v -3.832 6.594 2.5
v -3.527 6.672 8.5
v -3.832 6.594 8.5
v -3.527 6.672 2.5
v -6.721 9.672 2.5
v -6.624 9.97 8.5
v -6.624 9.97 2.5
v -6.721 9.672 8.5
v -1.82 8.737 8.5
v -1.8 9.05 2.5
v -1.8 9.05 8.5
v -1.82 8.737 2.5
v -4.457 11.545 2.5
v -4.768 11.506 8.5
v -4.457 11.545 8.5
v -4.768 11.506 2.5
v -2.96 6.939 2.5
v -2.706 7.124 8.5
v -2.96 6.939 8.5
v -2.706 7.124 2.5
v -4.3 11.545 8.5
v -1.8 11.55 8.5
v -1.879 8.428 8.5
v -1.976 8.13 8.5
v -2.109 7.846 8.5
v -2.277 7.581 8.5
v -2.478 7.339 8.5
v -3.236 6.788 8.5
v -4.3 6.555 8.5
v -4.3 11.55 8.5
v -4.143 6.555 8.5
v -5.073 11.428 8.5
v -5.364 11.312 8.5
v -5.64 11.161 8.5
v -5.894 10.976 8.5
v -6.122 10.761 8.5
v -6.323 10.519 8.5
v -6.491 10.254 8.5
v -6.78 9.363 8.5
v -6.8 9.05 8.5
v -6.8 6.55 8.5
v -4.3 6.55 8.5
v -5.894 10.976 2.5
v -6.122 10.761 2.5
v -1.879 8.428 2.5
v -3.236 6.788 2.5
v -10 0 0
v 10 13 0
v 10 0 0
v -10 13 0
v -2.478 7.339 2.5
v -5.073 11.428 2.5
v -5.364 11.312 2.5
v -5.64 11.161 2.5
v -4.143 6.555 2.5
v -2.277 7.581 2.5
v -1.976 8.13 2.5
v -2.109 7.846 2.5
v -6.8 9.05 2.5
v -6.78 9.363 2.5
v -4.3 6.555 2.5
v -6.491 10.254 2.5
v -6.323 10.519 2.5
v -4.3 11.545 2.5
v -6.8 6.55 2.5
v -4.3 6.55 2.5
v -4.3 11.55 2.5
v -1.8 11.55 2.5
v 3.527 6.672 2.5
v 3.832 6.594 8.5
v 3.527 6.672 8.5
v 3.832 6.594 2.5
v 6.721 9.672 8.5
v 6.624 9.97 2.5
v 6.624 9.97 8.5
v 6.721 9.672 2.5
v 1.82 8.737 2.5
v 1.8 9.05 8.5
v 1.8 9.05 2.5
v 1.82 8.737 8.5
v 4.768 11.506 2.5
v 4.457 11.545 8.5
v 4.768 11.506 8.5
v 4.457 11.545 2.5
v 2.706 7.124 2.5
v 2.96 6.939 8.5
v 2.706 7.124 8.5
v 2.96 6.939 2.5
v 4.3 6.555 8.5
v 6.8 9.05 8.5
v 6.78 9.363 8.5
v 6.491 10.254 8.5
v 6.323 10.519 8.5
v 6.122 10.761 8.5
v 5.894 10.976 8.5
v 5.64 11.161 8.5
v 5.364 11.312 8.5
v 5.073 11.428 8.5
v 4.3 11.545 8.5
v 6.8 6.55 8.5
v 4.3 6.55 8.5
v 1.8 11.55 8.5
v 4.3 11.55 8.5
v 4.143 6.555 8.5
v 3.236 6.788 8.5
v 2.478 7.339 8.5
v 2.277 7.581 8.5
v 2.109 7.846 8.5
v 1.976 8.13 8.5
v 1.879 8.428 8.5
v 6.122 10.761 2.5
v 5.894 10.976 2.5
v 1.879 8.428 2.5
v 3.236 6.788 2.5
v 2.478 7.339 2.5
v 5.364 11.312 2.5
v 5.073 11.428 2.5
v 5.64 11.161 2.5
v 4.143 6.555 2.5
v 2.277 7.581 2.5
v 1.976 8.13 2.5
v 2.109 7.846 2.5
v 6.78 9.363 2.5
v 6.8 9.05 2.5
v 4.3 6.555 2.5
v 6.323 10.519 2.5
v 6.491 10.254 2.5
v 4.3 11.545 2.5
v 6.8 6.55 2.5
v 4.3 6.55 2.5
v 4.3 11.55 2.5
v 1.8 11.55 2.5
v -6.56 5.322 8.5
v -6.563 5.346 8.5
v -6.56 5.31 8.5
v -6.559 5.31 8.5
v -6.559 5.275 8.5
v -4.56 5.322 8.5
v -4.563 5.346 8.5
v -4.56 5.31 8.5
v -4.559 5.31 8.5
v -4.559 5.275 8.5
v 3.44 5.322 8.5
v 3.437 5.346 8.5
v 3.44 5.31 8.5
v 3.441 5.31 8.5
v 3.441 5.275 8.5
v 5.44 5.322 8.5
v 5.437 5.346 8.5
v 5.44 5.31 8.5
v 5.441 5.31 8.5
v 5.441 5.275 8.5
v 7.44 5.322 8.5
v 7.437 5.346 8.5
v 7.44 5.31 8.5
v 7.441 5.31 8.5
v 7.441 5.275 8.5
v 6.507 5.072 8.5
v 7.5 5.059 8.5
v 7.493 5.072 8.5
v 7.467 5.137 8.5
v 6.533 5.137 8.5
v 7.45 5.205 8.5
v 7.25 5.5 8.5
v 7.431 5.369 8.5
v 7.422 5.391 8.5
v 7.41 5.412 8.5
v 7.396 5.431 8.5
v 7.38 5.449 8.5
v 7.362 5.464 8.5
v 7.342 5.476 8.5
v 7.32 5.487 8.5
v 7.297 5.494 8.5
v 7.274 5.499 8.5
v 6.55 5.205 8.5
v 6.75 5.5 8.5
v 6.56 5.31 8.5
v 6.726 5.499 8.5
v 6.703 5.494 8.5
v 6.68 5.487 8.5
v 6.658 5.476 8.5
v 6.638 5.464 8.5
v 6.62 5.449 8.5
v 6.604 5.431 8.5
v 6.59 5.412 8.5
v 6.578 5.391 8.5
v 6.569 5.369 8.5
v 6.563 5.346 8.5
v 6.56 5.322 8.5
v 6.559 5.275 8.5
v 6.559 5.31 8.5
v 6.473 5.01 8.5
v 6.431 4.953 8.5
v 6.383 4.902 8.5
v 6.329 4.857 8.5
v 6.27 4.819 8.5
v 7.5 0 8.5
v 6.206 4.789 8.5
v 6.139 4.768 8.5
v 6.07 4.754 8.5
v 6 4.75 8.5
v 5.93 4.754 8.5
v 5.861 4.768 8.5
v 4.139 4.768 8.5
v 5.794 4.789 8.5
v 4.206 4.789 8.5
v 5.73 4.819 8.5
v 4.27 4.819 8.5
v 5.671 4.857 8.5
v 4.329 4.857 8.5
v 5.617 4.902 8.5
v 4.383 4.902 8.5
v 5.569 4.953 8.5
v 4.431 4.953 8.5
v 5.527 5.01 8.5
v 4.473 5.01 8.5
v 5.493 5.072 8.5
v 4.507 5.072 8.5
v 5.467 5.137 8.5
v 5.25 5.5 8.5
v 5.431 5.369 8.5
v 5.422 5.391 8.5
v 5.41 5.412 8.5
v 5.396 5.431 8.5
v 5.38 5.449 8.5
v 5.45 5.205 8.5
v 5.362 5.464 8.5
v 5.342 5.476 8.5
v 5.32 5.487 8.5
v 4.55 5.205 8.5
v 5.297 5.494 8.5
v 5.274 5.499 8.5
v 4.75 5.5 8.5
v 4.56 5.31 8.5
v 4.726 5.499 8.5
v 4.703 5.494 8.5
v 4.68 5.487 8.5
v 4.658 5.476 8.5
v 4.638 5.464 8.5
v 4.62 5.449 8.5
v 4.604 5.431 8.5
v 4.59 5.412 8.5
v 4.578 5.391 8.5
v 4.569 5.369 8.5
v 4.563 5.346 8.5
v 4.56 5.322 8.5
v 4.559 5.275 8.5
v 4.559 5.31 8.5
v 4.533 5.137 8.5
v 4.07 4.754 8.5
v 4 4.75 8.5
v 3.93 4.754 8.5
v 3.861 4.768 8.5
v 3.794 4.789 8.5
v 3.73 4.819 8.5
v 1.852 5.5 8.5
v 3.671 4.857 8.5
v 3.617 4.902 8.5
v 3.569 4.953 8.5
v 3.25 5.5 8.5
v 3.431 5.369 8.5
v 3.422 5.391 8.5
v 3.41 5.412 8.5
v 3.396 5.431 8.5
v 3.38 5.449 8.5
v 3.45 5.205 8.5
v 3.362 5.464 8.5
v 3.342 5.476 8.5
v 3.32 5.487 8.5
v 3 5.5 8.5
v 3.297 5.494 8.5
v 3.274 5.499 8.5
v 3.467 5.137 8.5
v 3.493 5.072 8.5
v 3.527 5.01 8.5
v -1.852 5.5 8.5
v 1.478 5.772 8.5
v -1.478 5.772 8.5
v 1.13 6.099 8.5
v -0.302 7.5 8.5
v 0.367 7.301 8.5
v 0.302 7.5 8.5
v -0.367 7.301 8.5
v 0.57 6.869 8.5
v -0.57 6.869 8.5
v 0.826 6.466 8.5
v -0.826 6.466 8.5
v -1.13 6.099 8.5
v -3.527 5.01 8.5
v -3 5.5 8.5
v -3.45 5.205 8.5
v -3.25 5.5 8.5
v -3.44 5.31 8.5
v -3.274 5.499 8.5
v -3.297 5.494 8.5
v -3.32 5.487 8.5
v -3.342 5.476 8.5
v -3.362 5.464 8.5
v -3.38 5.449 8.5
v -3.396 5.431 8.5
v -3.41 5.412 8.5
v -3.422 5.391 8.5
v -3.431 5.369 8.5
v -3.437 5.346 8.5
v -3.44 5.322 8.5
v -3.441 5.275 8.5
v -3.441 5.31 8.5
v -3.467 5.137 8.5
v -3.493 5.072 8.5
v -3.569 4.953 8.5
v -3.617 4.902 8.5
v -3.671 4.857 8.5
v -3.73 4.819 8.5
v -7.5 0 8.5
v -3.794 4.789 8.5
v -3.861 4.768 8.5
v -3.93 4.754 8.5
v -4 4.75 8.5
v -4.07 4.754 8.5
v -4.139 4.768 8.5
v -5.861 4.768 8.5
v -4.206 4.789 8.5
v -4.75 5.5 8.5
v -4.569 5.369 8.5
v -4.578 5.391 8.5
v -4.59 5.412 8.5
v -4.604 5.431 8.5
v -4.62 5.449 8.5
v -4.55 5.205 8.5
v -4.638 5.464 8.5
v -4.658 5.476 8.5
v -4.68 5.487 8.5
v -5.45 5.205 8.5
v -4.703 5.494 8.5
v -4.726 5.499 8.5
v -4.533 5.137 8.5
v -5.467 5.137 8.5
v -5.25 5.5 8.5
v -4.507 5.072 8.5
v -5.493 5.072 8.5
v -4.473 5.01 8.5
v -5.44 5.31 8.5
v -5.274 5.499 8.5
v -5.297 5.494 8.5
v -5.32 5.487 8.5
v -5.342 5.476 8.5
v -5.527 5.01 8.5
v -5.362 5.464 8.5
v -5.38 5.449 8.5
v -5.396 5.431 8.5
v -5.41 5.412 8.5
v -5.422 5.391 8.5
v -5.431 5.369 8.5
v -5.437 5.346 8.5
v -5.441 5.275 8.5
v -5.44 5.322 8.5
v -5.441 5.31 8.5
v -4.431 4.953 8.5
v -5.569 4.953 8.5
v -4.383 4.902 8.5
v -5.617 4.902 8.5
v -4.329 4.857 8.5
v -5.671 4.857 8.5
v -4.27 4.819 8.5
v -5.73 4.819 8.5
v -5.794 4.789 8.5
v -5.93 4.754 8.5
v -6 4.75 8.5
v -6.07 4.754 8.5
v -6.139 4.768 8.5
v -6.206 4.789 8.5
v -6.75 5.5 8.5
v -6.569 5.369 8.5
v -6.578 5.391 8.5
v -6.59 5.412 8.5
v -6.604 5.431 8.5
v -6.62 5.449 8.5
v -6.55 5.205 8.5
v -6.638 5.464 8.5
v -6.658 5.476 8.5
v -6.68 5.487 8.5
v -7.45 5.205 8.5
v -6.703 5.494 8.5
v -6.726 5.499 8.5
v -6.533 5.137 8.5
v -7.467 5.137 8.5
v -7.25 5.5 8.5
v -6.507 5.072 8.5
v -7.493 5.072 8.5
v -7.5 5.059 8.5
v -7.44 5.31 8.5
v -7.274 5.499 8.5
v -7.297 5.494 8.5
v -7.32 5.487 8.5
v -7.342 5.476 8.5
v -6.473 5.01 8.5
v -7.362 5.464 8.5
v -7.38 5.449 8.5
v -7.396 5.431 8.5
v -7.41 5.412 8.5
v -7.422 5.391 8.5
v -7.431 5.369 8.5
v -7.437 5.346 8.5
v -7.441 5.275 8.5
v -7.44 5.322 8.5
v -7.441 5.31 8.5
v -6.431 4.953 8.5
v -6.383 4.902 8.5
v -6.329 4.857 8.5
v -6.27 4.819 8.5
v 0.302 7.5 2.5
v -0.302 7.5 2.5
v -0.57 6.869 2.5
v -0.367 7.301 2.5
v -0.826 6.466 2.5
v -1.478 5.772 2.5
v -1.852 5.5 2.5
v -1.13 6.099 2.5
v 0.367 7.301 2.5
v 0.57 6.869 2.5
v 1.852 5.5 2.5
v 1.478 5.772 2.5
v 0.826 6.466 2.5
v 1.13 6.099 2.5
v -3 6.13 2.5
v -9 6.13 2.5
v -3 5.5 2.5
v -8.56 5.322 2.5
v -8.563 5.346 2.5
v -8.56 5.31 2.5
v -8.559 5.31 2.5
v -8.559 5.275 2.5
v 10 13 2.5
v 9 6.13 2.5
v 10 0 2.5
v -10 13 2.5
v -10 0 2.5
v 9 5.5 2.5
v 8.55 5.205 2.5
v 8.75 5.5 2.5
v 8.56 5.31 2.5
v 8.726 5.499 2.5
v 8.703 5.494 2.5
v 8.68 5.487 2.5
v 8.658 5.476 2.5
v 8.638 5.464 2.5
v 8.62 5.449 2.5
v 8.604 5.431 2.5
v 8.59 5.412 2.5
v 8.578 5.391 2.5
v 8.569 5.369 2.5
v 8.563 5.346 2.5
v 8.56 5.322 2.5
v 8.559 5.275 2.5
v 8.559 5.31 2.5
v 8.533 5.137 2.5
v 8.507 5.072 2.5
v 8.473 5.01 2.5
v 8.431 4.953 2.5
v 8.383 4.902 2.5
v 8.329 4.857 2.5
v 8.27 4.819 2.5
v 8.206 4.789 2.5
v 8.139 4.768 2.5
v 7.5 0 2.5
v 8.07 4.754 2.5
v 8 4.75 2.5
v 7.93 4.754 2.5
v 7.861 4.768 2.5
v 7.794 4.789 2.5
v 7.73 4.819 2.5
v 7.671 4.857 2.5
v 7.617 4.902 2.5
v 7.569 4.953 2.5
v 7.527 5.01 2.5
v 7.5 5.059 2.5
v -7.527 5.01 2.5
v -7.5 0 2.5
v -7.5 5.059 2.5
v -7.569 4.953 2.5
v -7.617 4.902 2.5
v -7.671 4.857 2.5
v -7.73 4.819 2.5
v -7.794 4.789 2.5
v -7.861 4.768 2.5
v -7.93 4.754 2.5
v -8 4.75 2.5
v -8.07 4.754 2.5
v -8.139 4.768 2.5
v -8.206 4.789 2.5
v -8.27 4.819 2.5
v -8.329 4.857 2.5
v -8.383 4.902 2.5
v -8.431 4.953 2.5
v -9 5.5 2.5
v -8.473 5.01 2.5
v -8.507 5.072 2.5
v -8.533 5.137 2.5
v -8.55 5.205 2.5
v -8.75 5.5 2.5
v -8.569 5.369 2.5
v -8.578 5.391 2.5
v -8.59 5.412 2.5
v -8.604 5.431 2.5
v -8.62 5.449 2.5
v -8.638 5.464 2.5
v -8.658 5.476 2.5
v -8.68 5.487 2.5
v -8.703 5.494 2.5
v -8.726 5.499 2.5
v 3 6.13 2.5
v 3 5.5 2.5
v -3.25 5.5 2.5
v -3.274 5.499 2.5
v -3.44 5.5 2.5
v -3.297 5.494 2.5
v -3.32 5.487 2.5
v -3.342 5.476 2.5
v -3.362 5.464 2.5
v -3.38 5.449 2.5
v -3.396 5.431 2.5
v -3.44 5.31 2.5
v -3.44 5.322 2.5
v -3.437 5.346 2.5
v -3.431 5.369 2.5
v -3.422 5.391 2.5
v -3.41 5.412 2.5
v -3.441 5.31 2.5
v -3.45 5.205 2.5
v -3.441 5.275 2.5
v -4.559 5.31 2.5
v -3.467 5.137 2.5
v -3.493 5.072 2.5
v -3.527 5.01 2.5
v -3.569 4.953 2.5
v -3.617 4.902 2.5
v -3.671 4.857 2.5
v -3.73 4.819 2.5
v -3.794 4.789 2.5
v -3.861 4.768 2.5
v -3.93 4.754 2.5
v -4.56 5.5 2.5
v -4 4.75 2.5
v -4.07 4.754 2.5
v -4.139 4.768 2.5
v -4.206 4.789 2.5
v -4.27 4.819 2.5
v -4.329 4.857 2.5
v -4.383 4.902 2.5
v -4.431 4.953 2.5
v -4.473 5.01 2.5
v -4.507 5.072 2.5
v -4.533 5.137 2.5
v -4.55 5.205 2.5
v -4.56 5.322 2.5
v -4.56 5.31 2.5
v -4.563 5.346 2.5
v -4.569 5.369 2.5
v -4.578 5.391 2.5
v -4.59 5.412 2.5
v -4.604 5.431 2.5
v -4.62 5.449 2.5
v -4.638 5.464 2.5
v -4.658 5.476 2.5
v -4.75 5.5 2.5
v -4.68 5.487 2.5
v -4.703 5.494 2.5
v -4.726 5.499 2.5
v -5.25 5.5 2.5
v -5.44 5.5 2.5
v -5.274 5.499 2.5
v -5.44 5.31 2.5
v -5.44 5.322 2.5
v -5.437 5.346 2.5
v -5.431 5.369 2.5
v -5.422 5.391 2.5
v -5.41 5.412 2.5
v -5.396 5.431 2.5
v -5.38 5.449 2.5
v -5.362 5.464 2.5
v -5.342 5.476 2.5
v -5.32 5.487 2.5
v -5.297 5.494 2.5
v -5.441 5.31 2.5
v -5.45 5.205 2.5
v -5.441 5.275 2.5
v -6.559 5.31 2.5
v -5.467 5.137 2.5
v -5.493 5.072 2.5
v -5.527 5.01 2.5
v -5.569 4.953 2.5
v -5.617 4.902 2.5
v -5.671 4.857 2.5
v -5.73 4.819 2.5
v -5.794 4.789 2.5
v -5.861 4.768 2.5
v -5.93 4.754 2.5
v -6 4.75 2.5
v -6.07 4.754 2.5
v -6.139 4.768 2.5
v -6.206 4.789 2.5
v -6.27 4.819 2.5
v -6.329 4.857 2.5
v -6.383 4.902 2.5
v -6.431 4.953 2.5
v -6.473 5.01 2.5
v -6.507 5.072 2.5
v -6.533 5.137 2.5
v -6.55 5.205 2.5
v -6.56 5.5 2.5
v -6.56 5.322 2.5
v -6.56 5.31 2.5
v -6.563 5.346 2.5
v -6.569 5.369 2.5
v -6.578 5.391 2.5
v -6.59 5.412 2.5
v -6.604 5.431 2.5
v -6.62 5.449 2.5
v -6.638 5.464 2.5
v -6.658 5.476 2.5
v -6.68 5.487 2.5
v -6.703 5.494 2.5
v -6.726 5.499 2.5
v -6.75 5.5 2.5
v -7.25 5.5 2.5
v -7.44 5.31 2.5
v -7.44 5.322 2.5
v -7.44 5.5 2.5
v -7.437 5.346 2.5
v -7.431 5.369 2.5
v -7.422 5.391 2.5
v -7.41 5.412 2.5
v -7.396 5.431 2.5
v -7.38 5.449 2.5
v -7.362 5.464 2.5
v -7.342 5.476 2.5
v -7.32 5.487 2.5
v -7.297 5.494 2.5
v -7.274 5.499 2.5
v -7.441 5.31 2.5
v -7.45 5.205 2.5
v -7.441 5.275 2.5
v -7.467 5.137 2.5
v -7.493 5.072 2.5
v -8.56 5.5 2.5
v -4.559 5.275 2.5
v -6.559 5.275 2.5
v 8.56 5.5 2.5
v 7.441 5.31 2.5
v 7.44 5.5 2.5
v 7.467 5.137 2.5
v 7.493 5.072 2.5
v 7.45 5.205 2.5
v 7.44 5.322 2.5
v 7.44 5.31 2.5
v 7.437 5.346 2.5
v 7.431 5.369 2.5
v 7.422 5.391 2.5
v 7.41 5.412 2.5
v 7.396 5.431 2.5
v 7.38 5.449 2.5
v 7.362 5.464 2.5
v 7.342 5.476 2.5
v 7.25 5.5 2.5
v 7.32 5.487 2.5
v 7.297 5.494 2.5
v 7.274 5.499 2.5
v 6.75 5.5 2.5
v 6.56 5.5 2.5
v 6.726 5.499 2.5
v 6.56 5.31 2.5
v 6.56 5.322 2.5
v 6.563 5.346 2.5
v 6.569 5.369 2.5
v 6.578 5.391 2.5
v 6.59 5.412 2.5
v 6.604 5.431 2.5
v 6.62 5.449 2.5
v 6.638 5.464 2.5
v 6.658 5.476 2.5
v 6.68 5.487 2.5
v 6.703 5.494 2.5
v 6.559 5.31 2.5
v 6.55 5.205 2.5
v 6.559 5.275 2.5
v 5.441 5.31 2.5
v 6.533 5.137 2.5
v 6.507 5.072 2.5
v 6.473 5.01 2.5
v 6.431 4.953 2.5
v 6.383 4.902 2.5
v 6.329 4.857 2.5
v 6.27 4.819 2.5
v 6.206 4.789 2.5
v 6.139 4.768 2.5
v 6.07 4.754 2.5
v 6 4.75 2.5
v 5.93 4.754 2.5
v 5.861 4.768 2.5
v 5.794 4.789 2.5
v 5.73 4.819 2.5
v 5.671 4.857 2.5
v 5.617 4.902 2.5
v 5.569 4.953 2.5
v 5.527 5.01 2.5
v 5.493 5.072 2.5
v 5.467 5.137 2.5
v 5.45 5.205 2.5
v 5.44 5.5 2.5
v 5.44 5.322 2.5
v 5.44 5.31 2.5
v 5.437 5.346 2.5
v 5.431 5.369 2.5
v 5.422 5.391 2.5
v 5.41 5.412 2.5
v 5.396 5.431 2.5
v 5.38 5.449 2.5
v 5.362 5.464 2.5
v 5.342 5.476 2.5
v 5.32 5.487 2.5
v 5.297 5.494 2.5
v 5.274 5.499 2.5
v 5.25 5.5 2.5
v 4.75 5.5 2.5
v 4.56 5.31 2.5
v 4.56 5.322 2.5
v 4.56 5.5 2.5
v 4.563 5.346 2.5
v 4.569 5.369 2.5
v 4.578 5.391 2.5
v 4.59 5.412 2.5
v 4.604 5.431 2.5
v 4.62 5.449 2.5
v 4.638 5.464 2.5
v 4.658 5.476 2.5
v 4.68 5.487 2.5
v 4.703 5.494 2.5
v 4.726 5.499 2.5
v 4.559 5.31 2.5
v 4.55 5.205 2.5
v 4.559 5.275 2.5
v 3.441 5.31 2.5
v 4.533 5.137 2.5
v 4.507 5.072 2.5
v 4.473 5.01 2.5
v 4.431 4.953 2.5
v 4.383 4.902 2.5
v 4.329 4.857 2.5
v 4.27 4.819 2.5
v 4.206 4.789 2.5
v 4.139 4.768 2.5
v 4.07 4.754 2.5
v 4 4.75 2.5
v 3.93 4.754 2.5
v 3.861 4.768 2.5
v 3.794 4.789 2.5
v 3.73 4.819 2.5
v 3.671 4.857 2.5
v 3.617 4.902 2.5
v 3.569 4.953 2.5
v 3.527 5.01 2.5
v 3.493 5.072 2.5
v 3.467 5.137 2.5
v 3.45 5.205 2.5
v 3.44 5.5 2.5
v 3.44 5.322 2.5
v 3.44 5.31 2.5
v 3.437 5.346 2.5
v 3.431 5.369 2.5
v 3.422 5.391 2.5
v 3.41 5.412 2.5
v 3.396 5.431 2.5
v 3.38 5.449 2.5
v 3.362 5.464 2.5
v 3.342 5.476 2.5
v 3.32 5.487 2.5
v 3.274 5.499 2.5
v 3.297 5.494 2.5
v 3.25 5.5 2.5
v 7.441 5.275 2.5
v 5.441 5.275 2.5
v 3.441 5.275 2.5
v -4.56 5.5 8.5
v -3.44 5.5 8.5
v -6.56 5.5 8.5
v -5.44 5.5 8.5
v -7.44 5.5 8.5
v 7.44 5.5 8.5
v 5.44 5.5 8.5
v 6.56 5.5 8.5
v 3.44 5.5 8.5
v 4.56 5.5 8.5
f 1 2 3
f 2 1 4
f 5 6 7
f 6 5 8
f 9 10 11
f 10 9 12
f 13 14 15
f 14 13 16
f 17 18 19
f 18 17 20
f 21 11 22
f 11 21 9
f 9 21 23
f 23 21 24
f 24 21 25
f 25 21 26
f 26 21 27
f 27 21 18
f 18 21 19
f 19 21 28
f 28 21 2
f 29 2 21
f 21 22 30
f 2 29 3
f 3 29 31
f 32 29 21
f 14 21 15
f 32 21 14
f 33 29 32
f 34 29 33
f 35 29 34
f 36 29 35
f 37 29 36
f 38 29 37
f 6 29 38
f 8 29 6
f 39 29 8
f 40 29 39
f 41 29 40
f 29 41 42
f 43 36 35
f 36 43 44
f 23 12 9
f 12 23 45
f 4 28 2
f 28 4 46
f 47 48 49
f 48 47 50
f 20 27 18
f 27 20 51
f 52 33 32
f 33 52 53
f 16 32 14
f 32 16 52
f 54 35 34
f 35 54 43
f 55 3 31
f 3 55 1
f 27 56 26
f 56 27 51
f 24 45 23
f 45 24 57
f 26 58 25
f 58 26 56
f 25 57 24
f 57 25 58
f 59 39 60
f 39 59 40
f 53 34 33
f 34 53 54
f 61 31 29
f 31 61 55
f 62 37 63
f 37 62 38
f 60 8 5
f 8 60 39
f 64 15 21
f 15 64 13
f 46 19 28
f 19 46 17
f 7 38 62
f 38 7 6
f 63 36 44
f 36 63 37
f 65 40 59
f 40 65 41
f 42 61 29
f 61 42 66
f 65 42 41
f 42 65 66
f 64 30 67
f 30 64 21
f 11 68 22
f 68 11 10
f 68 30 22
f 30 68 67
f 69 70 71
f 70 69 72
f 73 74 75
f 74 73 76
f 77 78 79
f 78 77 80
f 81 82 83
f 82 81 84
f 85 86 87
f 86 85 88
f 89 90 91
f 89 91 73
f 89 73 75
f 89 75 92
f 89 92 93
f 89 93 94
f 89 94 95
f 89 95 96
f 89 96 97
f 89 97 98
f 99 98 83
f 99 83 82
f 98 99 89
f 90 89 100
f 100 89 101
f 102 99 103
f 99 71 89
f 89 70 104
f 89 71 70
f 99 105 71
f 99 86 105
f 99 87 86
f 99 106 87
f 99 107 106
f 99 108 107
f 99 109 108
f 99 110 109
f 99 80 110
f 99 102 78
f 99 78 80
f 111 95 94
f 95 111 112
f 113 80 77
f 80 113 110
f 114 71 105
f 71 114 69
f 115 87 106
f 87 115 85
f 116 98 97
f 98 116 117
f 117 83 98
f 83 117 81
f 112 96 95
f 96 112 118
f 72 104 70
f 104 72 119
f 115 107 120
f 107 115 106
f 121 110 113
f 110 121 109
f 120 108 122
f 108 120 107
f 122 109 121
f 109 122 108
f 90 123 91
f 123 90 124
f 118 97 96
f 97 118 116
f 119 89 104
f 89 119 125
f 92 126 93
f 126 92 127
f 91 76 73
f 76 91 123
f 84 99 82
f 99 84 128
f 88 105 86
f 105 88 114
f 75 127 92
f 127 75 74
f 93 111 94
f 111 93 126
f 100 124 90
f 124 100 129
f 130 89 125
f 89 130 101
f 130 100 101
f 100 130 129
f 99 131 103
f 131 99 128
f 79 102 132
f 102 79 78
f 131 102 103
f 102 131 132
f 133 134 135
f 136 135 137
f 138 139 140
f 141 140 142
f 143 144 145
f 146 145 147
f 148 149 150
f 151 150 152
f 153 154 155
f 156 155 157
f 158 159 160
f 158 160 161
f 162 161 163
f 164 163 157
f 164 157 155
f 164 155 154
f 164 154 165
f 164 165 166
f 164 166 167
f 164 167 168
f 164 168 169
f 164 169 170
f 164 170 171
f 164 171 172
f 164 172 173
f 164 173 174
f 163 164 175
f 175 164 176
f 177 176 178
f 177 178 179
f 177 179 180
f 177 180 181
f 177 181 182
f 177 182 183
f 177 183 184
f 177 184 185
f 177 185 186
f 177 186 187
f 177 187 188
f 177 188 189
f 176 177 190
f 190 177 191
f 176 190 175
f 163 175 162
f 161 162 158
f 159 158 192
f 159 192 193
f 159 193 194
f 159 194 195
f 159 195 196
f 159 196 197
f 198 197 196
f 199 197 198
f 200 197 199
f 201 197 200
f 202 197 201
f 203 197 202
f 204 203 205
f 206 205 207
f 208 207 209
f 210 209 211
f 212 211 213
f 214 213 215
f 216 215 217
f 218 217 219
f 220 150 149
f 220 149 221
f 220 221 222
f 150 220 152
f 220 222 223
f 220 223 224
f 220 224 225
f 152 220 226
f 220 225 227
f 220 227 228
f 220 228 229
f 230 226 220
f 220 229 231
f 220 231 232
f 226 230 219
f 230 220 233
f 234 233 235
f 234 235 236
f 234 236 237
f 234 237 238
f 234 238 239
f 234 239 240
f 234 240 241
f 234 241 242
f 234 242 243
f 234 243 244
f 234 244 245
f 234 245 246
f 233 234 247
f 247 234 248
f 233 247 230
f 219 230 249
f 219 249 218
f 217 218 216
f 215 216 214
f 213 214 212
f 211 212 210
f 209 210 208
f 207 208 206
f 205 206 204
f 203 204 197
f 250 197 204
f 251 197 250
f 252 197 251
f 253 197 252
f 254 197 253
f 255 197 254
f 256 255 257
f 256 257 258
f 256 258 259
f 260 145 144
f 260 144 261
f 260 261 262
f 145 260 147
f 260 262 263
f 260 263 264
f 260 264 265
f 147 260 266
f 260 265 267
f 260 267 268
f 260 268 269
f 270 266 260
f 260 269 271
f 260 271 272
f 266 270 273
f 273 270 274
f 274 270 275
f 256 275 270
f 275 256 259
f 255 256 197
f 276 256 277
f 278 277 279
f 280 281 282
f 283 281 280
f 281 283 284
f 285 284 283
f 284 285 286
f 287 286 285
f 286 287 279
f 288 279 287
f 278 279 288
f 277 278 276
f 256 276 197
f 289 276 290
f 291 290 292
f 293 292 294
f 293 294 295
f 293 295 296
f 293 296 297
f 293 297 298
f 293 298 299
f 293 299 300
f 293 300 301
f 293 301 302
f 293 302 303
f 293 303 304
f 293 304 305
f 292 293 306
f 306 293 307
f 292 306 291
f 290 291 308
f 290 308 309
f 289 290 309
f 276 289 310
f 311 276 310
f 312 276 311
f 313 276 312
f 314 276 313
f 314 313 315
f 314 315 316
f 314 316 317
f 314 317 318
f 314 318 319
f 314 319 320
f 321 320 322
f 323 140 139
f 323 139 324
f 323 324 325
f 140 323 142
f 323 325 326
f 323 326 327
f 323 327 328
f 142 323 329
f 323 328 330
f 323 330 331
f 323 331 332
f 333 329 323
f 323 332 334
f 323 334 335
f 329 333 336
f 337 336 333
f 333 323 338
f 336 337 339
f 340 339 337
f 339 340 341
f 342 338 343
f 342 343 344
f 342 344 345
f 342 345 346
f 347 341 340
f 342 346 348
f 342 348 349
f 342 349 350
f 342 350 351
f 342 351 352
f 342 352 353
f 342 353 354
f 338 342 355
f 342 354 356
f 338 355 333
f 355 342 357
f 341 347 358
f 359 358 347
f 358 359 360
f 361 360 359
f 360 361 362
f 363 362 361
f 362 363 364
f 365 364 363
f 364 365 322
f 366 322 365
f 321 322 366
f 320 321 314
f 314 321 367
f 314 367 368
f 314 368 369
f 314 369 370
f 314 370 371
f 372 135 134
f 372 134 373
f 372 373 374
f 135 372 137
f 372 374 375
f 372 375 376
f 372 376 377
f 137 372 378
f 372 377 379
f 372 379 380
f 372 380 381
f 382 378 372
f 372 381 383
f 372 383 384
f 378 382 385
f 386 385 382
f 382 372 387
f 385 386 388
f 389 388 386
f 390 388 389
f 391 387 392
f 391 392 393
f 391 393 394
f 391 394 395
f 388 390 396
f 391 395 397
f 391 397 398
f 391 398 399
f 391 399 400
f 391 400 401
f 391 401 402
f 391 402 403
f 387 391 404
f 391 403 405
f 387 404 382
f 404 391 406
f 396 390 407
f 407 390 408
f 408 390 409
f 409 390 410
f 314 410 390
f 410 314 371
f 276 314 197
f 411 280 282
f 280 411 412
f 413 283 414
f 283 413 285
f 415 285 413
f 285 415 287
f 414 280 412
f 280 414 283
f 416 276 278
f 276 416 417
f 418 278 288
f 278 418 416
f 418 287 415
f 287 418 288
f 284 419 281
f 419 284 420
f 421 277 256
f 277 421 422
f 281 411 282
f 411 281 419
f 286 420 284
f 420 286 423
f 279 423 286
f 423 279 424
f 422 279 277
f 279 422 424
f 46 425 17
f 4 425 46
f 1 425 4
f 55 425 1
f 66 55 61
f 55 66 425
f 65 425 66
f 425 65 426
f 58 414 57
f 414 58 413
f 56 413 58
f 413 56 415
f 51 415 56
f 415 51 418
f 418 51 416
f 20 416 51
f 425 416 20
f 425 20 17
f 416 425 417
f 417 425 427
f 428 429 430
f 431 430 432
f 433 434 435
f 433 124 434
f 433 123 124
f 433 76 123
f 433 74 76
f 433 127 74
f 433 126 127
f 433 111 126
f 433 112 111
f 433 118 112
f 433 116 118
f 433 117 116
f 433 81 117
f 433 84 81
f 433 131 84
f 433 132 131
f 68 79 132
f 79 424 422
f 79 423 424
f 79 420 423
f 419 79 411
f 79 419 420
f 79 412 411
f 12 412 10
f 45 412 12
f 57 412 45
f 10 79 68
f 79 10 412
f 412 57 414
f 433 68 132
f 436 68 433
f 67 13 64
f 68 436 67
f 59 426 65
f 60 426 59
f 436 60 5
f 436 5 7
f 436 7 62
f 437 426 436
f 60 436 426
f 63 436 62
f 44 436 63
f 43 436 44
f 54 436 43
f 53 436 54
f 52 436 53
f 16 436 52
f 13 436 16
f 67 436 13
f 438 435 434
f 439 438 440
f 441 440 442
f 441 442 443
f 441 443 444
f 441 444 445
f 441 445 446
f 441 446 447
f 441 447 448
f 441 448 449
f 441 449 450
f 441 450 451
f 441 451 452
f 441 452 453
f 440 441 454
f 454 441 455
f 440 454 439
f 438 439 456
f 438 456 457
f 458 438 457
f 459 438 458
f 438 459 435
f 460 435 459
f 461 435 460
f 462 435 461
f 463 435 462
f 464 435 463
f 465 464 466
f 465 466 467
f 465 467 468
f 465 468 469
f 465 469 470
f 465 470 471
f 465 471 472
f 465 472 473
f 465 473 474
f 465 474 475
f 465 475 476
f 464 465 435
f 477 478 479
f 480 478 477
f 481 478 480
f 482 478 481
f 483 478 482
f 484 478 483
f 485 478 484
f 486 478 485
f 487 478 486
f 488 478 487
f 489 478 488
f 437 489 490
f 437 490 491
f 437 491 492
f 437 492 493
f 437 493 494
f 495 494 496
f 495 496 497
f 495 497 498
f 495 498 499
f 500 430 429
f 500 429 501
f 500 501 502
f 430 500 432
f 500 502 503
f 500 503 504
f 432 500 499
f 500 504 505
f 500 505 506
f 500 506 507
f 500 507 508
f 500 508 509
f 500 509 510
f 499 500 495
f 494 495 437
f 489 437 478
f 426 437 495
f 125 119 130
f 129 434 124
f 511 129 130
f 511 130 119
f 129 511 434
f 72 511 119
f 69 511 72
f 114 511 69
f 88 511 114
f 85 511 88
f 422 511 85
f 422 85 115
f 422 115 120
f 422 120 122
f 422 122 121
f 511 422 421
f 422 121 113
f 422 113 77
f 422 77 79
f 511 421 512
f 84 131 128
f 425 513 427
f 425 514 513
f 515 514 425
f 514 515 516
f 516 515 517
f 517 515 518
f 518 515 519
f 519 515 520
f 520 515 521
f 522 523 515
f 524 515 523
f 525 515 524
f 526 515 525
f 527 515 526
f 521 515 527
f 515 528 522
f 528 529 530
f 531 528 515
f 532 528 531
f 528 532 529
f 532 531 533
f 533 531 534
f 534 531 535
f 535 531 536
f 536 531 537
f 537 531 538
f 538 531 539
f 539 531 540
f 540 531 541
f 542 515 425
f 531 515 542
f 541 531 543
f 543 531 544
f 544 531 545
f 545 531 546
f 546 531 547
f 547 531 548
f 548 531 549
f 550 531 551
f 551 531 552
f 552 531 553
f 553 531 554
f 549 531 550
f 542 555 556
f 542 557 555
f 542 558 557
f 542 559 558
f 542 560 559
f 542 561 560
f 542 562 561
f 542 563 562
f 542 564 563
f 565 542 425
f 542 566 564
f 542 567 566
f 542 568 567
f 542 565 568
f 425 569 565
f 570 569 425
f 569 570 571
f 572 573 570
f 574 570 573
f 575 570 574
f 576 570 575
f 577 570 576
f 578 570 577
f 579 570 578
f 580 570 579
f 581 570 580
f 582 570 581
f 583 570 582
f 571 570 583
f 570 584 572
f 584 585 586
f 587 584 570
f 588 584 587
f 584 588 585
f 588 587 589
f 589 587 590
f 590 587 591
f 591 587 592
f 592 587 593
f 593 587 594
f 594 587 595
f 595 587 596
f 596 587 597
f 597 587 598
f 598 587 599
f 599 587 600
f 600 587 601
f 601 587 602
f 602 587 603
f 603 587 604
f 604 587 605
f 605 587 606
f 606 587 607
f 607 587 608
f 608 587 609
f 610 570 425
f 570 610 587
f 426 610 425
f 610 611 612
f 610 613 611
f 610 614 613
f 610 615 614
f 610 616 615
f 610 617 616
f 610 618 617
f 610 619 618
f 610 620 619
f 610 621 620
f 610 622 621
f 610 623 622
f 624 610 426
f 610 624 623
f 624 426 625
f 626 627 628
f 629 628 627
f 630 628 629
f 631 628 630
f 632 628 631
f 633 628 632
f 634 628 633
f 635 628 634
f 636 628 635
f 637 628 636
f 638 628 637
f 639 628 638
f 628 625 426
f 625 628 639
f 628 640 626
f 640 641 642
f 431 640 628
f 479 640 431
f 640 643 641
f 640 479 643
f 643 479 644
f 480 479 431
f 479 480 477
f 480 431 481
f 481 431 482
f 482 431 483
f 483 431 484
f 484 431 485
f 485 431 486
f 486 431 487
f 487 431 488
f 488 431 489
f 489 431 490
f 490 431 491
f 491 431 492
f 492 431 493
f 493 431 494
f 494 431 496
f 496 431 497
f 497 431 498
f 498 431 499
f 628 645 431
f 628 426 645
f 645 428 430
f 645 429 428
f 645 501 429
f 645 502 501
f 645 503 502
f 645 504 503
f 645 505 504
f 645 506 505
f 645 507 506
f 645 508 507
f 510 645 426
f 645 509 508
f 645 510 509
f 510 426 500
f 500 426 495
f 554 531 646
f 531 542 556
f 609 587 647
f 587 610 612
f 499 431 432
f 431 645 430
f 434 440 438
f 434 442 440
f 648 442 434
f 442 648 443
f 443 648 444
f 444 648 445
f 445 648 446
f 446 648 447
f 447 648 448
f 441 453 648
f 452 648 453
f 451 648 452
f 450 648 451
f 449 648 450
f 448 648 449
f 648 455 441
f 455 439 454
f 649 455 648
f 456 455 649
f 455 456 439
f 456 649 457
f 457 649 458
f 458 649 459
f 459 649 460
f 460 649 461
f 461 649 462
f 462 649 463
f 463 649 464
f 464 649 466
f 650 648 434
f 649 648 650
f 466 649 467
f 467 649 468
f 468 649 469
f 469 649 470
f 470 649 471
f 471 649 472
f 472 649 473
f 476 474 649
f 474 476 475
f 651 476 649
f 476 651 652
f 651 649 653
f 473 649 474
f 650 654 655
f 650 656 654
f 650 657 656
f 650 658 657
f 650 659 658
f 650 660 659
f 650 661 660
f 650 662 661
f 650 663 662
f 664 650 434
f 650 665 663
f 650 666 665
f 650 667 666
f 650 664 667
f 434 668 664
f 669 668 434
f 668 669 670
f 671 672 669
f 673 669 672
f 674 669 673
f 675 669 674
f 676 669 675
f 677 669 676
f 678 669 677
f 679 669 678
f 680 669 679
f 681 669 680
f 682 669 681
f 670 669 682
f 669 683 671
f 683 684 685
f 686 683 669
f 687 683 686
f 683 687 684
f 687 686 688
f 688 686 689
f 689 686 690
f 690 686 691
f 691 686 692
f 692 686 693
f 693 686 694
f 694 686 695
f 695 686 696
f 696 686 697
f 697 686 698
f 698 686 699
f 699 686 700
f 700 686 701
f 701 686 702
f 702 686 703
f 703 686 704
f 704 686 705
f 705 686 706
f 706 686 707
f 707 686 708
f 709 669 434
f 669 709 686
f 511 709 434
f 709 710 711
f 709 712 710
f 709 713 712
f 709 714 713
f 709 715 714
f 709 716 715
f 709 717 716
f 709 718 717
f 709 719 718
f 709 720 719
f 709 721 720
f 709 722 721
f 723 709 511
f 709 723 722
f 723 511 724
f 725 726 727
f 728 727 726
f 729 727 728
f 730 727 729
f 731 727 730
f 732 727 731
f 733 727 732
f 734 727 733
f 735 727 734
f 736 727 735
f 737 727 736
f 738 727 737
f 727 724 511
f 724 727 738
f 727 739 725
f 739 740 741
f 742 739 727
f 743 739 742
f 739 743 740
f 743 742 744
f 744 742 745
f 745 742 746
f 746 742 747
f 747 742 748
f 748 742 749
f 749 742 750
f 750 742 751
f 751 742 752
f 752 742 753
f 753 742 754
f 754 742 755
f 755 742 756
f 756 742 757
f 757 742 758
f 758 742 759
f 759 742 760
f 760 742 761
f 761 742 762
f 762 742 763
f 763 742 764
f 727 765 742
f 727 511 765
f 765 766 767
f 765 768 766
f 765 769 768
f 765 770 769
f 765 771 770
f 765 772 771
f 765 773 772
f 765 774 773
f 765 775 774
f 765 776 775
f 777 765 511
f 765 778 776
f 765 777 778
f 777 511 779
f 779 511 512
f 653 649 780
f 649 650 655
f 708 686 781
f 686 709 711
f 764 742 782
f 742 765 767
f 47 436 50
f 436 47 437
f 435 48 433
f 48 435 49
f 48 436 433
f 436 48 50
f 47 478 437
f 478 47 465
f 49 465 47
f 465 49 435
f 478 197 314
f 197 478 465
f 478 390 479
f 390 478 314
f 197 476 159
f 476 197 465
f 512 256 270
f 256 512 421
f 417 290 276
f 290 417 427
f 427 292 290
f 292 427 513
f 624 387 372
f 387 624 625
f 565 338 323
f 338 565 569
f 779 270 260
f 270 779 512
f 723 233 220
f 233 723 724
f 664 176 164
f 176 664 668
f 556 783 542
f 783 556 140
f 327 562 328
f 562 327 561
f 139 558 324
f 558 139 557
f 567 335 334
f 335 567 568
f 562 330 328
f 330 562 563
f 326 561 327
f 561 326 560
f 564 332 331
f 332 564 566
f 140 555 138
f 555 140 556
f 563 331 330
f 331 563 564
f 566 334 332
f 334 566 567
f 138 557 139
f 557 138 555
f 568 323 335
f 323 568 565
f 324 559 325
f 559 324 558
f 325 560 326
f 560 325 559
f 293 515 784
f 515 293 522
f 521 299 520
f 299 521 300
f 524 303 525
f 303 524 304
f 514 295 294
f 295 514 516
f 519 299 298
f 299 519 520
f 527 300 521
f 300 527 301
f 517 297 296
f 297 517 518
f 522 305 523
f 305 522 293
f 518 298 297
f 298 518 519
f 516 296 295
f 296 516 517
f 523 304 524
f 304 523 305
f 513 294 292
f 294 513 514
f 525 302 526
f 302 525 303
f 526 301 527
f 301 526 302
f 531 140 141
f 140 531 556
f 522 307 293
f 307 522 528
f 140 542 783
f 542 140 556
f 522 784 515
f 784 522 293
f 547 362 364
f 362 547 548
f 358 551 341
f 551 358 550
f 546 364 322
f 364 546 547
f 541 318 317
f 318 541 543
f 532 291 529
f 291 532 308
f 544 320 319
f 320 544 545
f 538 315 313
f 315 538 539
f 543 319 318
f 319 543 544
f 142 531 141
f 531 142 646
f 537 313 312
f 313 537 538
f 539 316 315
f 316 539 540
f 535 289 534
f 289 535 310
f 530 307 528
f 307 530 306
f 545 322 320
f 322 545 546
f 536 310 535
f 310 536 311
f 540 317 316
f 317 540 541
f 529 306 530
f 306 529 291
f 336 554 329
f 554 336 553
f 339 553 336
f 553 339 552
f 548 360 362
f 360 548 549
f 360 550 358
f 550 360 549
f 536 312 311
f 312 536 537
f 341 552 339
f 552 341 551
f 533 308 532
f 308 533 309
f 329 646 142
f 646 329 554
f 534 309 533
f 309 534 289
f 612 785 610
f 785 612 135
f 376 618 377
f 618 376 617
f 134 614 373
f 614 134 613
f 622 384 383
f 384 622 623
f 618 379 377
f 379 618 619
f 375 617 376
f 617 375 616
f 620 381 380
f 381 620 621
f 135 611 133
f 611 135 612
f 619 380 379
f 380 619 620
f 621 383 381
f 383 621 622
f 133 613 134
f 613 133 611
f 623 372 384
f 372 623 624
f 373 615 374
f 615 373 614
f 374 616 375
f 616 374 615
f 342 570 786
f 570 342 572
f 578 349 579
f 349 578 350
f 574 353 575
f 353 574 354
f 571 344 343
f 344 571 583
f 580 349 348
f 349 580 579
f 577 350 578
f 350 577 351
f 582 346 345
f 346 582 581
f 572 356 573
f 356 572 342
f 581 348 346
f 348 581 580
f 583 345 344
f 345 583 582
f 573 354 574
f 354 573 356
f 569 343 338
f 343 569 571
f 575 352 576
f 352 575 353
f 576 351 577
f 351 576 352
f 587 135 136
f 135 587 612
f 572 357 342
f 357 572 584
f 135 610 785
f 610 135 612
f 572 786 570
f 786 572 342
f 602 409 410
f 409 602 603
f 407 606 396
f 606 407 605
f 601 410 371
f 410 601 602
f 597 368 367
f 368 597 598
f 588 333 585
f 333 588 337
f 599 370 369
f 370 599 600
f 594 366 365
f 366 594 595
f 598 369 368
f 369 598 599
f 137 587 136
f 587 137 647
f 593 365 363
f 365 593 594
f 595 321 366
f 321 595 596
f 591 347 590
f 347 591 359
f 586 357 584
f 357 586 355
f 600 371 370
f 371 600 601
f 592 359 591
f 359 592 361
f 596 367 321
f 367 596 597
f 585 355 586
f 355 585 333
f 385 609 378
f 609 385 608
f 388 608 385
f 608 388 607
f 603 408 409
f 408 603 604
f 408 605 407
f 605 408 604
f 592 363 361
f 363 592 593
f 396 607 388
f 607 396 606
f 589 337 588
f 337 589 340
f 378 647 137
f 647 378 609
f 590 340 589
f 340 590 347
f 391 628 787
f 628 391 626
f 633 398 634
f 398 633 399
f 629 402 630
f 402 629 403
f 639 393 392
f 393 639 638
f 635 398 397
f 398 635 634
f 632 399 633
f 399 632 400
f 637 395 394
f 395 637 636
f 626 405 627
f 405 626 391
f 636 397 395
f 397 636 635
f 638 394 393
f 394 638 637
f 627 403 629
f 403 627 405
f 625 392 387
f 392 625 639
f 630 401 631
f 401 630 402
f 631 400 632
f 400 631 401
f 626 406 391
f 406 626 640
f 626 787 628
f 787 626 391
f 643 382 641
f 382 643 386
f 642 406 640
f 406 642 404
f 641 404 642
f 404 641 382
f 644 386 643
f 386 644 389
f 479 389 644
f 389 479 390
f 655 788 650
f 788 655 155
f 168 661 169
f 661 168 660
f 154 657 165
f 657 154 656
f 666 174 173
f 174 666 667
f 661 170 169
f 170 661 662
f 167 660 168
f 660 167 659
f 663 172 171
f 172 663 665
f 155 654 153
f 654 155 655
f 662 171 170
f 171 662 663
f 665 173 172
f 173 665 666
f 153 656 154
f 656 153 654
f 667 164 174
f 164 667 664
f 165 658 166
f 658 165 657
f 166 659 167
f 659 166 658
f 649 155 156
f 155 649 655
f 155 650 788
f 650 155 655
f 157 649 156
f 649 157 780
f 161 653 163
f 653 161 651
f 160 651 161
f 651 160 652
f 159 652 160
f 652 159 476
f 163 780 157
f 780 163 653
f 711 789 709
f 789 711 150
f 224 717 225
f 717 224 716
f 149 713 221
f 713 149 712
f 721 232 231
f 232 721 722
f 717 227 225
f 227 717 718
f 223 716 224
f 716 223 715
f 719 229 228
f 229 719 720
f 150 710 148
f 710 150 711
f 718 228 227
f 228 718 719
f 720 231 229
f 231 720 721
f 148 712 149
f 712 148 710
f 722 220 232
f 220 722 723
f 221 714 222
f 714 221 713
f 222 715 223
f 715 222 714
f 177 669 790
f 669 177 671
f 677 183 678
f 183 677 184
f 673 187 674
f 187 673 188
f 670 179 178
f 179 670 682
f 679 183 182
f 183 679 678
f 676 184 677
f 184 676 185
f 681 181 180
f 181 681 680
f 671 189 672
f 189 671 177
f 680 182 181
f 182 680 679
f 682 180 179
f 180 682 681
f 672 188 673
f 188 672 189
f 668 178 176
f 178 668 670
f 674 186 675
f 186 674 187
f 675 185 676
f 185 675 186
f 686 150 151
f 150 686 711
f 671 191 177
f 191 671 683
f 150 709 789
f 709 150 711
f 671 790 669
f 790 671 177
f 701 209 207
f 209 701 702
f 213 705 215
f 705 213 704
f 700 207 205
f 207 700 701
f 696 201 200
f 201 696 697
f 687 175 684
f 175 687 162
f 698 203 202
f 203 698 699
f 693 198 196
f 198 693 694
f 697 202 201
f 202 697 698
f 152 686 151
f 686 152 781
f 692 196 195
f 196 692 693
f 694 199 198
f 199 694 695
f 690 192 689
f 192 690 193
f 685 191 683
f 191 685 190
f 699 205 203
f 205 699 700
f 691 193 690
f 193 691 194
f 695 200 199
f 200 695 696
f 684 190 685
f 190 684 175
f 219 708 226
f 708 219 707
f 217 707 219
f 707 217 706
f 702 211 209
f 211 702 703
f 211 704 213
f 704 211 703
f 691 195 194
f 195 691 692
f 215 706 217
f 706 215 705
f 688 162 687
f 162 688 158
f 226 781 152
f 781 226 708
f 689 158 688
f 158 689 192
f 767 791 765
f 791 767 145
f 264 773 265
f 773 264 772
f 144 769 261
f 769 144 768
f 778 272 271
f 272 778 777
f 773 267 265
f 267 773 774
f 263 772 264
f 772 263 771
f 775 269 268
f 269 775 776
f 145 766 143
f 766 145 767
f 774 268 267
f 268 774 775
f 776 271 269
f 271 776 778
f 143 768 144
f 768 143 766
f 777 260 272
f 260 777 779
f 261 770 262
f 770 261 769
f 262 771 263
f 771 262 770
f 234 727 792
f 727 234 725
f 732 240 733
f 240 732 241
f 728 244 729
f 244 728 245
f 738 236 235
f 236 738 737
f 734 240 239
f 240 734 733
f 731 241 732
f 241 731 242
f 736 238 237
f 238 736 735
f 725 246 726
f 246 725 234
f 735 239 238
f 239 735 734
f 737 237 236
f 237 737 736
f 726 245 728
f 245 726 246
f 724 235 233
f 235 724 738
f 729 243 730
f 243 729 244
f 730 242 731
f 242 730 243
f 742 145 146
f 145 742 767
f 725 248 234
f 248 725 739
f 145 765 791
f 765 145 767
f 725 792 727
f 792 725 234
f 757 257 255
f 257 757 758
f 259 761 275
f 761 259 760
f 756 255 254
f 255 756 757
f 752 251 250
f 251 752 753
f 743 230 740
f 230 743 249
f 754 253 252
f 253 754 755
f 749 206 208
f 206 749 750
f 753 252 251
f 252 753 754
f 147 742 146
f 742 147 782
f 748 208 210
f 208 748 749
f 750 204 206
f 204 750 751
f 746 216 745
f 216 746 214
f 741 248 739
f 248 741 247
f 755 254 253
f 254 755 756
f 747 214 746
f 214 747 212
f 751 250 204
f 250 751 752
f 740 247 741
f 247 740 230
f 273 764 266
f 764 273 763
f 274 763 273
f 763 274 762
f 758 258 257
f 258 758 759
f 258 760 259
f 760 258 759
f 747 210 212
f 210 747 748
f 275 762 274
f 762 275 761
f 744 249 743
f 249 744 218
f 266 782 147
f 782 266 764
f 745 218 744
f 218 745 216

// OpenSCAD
$fn=50;


// Increase this if your slicer or printer make holes too tight.
extra_radius = 0.1;


///////////////////////////////////////////////////////
// Constants
m3_screw_slop = 0.1;
m3_screw_dia = 3.0 + m3_screw_slop;
m3_screw_head_slop = 0.45;
m3_screw_head_dia = 5.5 + m3_screw_head_slop;

// Major diameter of metric 3mm thread.
m3_major = 2.85;
m3_radius = m3_major/2 + extra_radius;
m3_wide_radius = m3_major/2 + extra_radius + 0.2;


///////////////////////////////////////////////////////
// Ajustable variables

// 30 reel - 1.5 pour pression
wheels_spacing = 30 - 1.5;
wheels_height_pos = 37;


belt_position = 2.5;
belt_spacing  = 9.5;
extrusion_width = 15;

ball_joints_spacing = 40;
ball_joints_z_position = 25;
horn_thickness=15;
horn_height = 18;
horn_length = 12;

surface_height = 6;


belt_gt2_height = 6;
module belt_gt2_part() {
    for(m=[0,1]) mirror([0,m,0]) {
        translate([-0.75,0.56,0])
            difference() {
                cube([0.19, 0.19, belt_gt2_height]);
                translate([0.19,0.19,0])cylinder(r=0.19, h=belt_gt2_height);
            }
    }
    translate([-0.75,-0.56,0])cube([0.19, 2*0.56, belt_gt2_height]);
    translate([0.19-0.75, 0, 0])cylinder(r=0.56, h=belt_gt2_height);
}

module belt_gt2(number) {
    mirror([0,0,1]) rotate([0, 90, 0]) rotate([0, 0, -90]) {
        translate([-1.38,-1,0]) cube([1.38-0.75, number*2, belt_gt2_height]);
        for(i = [0:number-1]) translate([0,2*i,0]){
            belt_gt2_part();
        }
    }
}

module around_the_carriage() {
    the_height = 100;

    // The belt
    mirror([0,1,0]) translate([belt_position, belt_spacing/2,-8])   belt_gt2(9);
    mirror([0,0,0]) translate([belt_position, belt_spacing/2, 4])   belt_gt2(3);
    mirror([0,0,0]) translate([belt_position, belt_spacing/2,-8])   belt_gt2(3);
    
}


module carriage() {
    // "Surface"
    pos = ball_joints_spacing/2-horn_length;
    translate([0, 0, -20/2])
        cube([2.5, 13, 20]);


    // Belt clamps
    belt_clamp_height=belt_position + belt_gt2_height;
    translate([0,0,-15/2])
        cube([belt_clamp_height,5.5, 15]);

    translate([0,4.75+1.8+5/2,0]) {
         for(m=[0,1]) mirror([0,0,m]) translate([0,0,5/2+1.8]){
            rotate([0,90,0]) cylinder(d=5,h=belt_clamp_height);
            translate([0,-5/2,0]) cube([belt_clamp_height,5/2,5/2]);
            translate([0,0,-5/2]) cube([belt_clamp_height,5/2,5/2]);
        }
    }
    difference([]) {
        translate([0,5,-6/2]) cube([belt_clamp_height,5/2,6]);
        diam = 5+2.6;
        translate([-0.05,4.75+1.45+5/2, 5/2+1.4]) rotate([0,90,0]) cylinder(d=diam,h=belt_clamp_height+.1);
        translate([-0.05,4.75+1.45+5/2,-5/2-1.4]) rotate([0,90,0]) cylinder(d=diam,h=belt_clamp_height+.1);
        
    }
//    translate([0,5+1.45,0])
//        cube([30,4.75, belt_clamp_height]);
    
    
    

}

rotate([0,-90,0])
difference() {
    carriage();
    #around_the_carriage();
}
